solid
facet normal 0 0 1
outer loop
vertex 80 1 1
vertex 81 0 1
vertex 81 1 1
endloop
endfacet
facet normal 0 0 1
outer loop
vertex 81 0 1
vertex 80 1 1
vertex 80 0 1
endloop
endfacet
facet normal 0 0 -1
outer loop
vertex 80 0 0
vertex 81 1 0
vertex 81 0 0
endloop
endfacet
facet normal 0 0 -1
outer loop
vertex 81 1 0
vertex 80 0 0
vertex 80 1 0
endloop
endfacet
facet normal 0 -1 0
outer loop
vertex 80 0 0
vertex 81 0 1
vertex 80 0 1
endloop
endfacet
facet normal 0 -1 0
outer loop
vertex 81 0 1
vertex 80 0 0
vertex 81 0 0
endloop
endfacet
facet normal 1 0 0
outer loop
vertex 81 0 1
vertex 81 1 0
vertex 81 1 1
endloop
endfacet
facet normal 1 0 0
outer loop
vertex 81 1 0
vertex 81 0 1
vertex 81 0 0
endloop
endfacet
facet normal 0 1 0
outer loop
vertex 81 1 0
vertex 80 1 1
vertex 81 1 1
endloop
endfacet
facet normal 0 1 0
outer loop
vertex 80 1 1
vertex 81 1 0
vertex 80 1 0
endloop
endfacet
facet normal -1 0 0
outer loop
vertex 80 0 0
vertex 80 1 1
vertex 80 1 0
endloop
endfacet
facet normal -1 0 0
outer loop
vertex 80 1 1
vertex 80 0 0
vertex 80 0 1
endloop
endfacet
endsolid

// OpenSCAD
// file: C:/gh/oomlout_oobb_part_motor_gearbox_wave_drive_version_5/parts/oobb_part_motor_gearbox_wave_drive_version_5_12_to_1_reduction/compact_helpers.scad
// Reusable native geometry helpers.
function polar(r,a)=[r*cos(a),r*sin(a)];
function rotate_point(p,a)=[p[0]*cos(a)-p[1]*sin(a),p[0]*sin(a)+p[1]*cos(a)];
function profile_point(t)=let(
    s=sqrt(pow(pitch_radius,2)-pow(eccentricity*sin(cavity_count*t),2)),
    r=eccentricity*cos(cavity_count*t)+s,
    xi=atan2(eccentricity*cavity_count*sin(cavity_count*t),s),
    rr=roller_radius+profile_clearance)
    [r*cos(t)+rr*cos(t+xi),r*sin(t)+rr*sin(t+xi)];
function profile_points(upper=false)=[for(i=[0:cavity_count*profile_samples_per_cavity-1])
    rotate_point(profile_point(360*i/(cavity_count*profile_samples_per_cavity)),0)];
function roller_position(i,a,upper=false)=let(
    t=-a/roller_count+360*i/roller_count,
    rel=t-a-(upper?180:0),
    r=eccentricity*cos(rel)+sqrt(pow(pitch_radius,2)-pow(eccentricity*sin(rel),2))) polar(r,t);
module tube(ro,ri,h) { difference() { cylinder(r=ro,h=h); translate([0,0,-eps]) cylinder(r=ri,h=h+2*eps); } }
module screw_hole(size,h) { scale([1,1,h]) { if(size=="m2") oobb_hole_m2(); if(size=="m3") oobb_hole_m3(); if(size=="m6") oobb_hole_m6(); } }
module socket_recess(size,depth) {
    // OOBB socket head starts at the under-head plane and extends outward.
    scale([1,1,depth/(size=="m3"?3.2:2.2)]) {
        if(size=="m3") oobb_socket_m3(); else oobb_socket_m2();
    }
}
module at_mounts(points) { for(p=points) translate([p[0],p[1],0]) children(); }
module shaft_cut(h,fit=shaft_fit_clearance) {
    linear_extrude(h) intersection() {
        circle(r=input_shaft_diameter/2+fit);
        translate([-10,-10]) square([10+input_shaft_diameter/2-input_shaft_flat_depth+fit,20]);
    }
}
module rounded_rectangle_plate(size=[119,119,3],radius=1.5) {
    hull() for(x=[-1,1],y=[-1,1]) translate([x*(size[0]/2-radius),y*(size[1]/2-radius),0]) cylinder(r=radius,h=size[2]);
}
module grid_cuts(h) {
    // Actual OOBB grid centres: six units are centred on half-pitch offsets.
    for(i=[0:base_width-1],j=[0:base_height-1])
        let(x=(i-(base_width-1)/2)*oobb_grid_pitch,y=(j-(base_height-1)/2)*oobb_grid_pitch)
        if(sqrt(x*x+y*y)>housing_radius+3.5)
            translate([x,y,-eps]) screw_hole("m6",h+2*eps);
}
module wave_generator() {
    render(convexity=20) difference() {
        tube(wave_radius,12.6,wave_height);
        translate([0,0,wave_seat_z]) cylinder(r=13.5+bearing_seat_clearance,h=wave_height);
        translate([0,0,wave_height-wave_cap_depth]) cylinder(r=22.15,h=wave_cap_depth+eps);
        at_mounts(wave_mounts) {
            translate([0,0,-eps]) screw_hole("m3",wave_height+2*eps);
            translate([0,0,wave_nut_z]) scale([1,1,(wave_height-wave_cap_depth-wave_nut_z+eps)/2.7]) oobb_nut_m3();
        }
    }
}
module wave_cap() {
    render(convexity=20) difference() {
        tube(22,12.6,wave_cap_depth);
        at_mounts(wave_mounts) {
            translate([0,0,-eps]) screw_hole("m3",wave_cap_depth+2*eps);
            translate([0,0,wave_cap_depth-wave_head_recess]) socket_recess("m3",wave_head_recess+eps);
        }
    }
}
// file: C:/gh/oomlout_oobb_part_motor_gearbox_wave_drive_version_5/parts/oobb_part_motor_gearbox_wave_drive_version_5_12_to_1_reduction/nema17_reference.scad
// Visual reference matching the previous cycloidal project's 40 mm motor envelope.
// Face is Z=0; motor body extends towards -Z and shaft towards +Z.
// End caps, corner chamfers and connector are illustrative external details.
// This is purchased reference hardware, never a printable gearbox component.
module nema17_outline(width=42.3,depth=6,chamfer=3) {
    w=width/2;
    linear_extrude(depth) polygon([
        [-w+chamfer,-w],[w-chamfer,-w],[w,-w+chamfer],[w,w-chamfer],
        [w-chamfer,w],[-w+chamfer,w],[-w,w-chamfer],[-w,-w+chamfer]
    ]);
}
module nema17_front() {
    difference() {
        translate([0,0,-motor_cap_depth])
            nema17_outline(motor_body_width,motor_cap_depth,motor_corner_chamfer);
        for(x=[-motor_hole_pitch/2,motor_hole_pitch/2],y=[-motor_hole_pitch/2,motor_hole_pitch/2])
            translate([x,y,-motor_thread_depth]) cylinder(d=3,h=motor_thread_depth+0.01);
        translate([0,0,-motor_cap_depth-0.01]) cylinder(d=motor_shaft_diameter,h=motor_cap_depth+0.02);
    }
}
module nema17_stator() {
    translate([0,0,-motor_body_depth+motor_cap_depth])
        nema17_outline(motor_body_width,motor_body_depth-2*motor_cap_depth,motor_corner_chamfer);
}
module nema17_rear() {
    difference() {
        translate([0,0,-motor_body_depth])
            nema17_outline(motor_body_width,motor_cap_depth,motor_corner_chamfer);
        for(x=[-motor_hole_pitch/2,motor_hole_pitch/2],y=[-motor_hole_pitch/2,motor_hole_pitch/2])
            translate([x,y,-motor_body_depth-0.01]) cylinder(d=4.5,h=1.2);
    }
}
module nema17_pilot() {
    difference() {
        cylinder(d=motor_pilot_diameter,h=motor_pilot_height);
        translate([0,0,-0.01]) cylinder(d=motor_shaft_diameter,h=motor_pilot_height+0.02);
    }
}
module nema17_shaft() {
    linear_extrude(motor_shaft_length) intersection() {
        circle(d=motor_shaft_diameter);
        translate([-10,-10]) square([10+motor_shaft_diameter/2-motor_shaft_flat_depth,20]);
    }
}
module nema17_connector() {
    // Indicative connector envelope; actual cable exit depends on motor model.
    translate([-7,motor_body_width/2-1,-motor_body_depth+motor_cap_depth])
        cube([14,5,7]);
}
module nema17_reference() {
    color("Silver") { nema17_front(); nema17_rear(); nema17_pilot(); nema17_shaft(); }
    color([0.08,0.08,0.08]) nema17_stator();
    color([0.2,0.2,0.2]) nema17_connector();
}
// file: C:/gh/oomlout_oobb_part_motor_gearbox_wave_drive_version_5/parts/oobb_part_motor_gearbox_wave_drive_version_5_12_to_1_reduction/motor_reference_parameters.scad
// Purchased motor envelope. Recipe defines body, shaft and mounting dimensions.
motor_body_depth = 40.0;
motor_shaft_length = 24.0;
motor_hole_pitch = 31.0;
motor_thread_depth = 6.0;
motor_pilot_diameter = 22.0;
motor_pilot_height = 2.0;
motor_shaft_end_clearance = 0.5;
motor_thread_engagement = 5.2;
motor_shaft_diameter = 5.0;
motor_body_width = 42.3;
motor_cap_depth = 6.0;
motor_corner_chamfer = 3.0;
motor_shaft_flat_depth = 0.5;
motor_face_z = 0.0;
// file: C:/gh/oomlout_oobb_part_motor_gearbox_wave_drive_version_5/parts/oobb_part_motor_gearbox_wave_drive_version_5_12_to_1_reduction/oobb_hardware.scad
module oobb_rounded_rectangle_edges(size, radius, radius_top, radius_bottom) {
      rt=radius_top; rb=radius_bottom; depth=size[2]; n=16;
      lower=rb==0 ? [[radius,0]] :
        [for(i=[0:n]) let(a=-90+90*i/n) [radius-rb+rb*cos(a),rb+rb*sin(a)]];
      upper=rt==0 ? [[radius,depth]] :
        [for(i=[0:n]) let(a=90*i/n) [radius-rt+rt*cos(a),depth-rt+rt*sin(a)]];
      hull() for(x=[-size[0]/2+radius,size[0]/2-radius])
        for(y=[-size[1]/2+radius,size[1]/2-radius])
          translate([x,y,0]) rotate_extrude()
            polygon(concat([[0,0]],lower,upper,[[0,depth]]));
    }
// Generated from installed OOBB v5. All primitives use overhang=True.

module oobb_motor_plate_body() {


difference() {
	union() {
		translate(v = [0, 0, 0]) {
			rotate(a = [0, 0, 0]) {
				difference() {
					union() {
						oobb_rounded_rectangle_edges(radius = 1.5, radius_bottom = 1.5, radius_top = 1.5, size = [89.0, 89.0, 4.0]);
					}
					union();
				}
			}
		}
	}
	union();
}

}

module oobb_hole_m2() {


difference() {
	union() {
		cylinder(h = 1, r = 1.35);
	}
	union();
}

}

module oobb_hole_m3() {


difference() {
	union() {
		cylinder(h = 1, r = 1.8);
	}
	union();
}

}

module oobb_hole_m6() {


difference() {
	union() {
		cylinder(h = 1, r = 3.25);
	}
	union();
}

}

module oobb_nut_m2() {


difference() {
	union() {
		translate(v = [0, 0, 0]) {
			rotate(a = [0, 0, 0]) {
				difference() {
					union() {
						linear_extrude(height = 2.2) {
							polygon(points = [[2.4234, 0.0], [1.2117000000000002, 2.0987259635312085], [-1.2116999999999996, 2.0987259635312085], [-2.4234, 2.967809053053696e-16], [-1.211700000000001, -2.098725963531208], [1.2116999999999984, -2.0987259635312094]]);
						}
						translate(v = [-1.25, -2.75, -0.3]) {
							cube(size = [2.5, 5.5, 0.3]);
						}
						translate(v = [-1.25, -1.25, -0.6]) {
							cube(size = [2.5, 2.5, 0.3]);
						}
						translate(v = [-1.25, -2.75, 2.2]) {
							cube(size = [2.5, 5.5, 0.3]);
						}
						translate(v = [-1.25, -1.25, 2.5]) {
							cube(size = [2.5, 2.5, 0.3]);
						}
					}
					union();
				}
			}
		}
	}
	union();
}

}

module oobb_socket_m2() {


difference() {
	union() {
		translate(v = [0, 0, 0]) {
			rotate(a = [0, 0, 0]) {
				difference() {
					union() {
						cylinder(h = 2.2, r = 2.1);
						translate(v = [-1.25, -2.75, -0.3]) {
							cube(size = [2.5, 5.5, 0.3]);
						}
						translate(v = [-1.25, -1.25, -0.6]) {
							cube(size = [2.5, 2.5, 0.3]);
						}
					}
					union();
				}
			}
		}
	}
	union();
}

}

module oobb_nut_m3() {


difference() {
	union() {
		translate(v = [0, 0, 0]) {
			rotate(a = [0, 0, 0]) {
				difference() {
					union() {
						linear_extrude(height = 2.7) {
							polygon(points = [[3.4619999999999997, 0.0], [1.7310000000000003, 2.9981799479017264], [-1.7309999999999992, 2.9981799479017264], [-3.4619999999999997, 4.2397272186481365e-16], [-1.7310000000000014, -2.998179947901726], [1.7309999999999977, -2.9981799479017277]]);
						}
						translate(v = [-1.75, -3.25, -0.3]) {
							cube(size = [3.5, 6.5, 0.3]);
						}
						translate(v = [-1.75, -1.75, -0.6]) {
							cube(size = [3.5, 3.5, 0.3]);
						}
						translate(v = [-1.75, -3.25, 2.7]) {
							cube(size = [3.5, 6.5, 0.3]);
						}
						translate(v = [-1.75, -1.75, 3.0]) {
							cube(size = [3.5, 3.5, 0.3]);
						}
					}
					union();
				}
			}
		}
	}
	union();
}

}

module oobb_socket_m3() {


difference() {
	union() {
		translate(v = [0, 0, 0]) {
			rotate(a = [0, 0, 0]) {
				difference() {
					union() {
						cylinder(h = 3.2, r = 3.0);
						translate(v = [-1.75, -3.25, -0.3]) {
							cube(size = [3.5, 6.5, 0.3]);
						}
						translate(v = [-1.75, -1.75, -0.6]) {
							cube(size = [3.5, 3.5, 0.3]);
						}
					}
					union();
				}
			}
		}
	}
	union();
}

}

module oobb_nut_m6() {


difference() {
	union() {
		translate(v = [0, 0, 0]) {
			rotate(a = [0, 0, 0]) {
				difference() {
					union() {
						linear_extrude(height = 5.2) {
							polygon(points = [[5.914249999999999, 0.0], [2.957125, 5.1218907443321156], [-2.9571249999999982, 5.1218907443321156], [-5.914249999999999, 7.242867331857232e-16], [-2.9571250000000022, -5.121890744332115], [2.9571249999999956, -5.121890744332118]]);
						}
						translate(v = [-2.875, -5.0, -0.3]) {
							cube(size = [5.75, 10, 0.3]);
						}
						translate(v = [-2.875, -2.875, -0.6]) {
							cube(size = [5.75, 5.75, 0.3]);
						}
						translate(v = [-2.875, -5.0, 5.2]) {
							cube(size = [5.75, 10, 0.3]);
						}
						translate(v = [-2.875, -2.875, 5.5]) {
							cube(size = [5.75, 5.75, 0.3]);
						}
					}
					union();
				}
			}
		}
	}
	union();
}

}
// file: C:/gh/oomlout_oobb_part_motor_gearbox_wave_drive_version_5/parts/oobb_part_motor_gearbox_wave_drive_version_5_12_to_1_reduction/parameters.scad
// Generated by working_scad.py. Edit the Python recipe to persist changes.
style = "version_5";
reduction = 12;
bearing_output = "6810";
bearing_wave = "6704";
roller_diameter = 7.0;
roller_bore_diameter = 3.2;
roller_length = 12.0;
roller_material = "nylon";
roller_bank_count = 1;
motor_plate_depth = 4.0;
motor_body_depth = 40.0;
motor_shaft_length = 24.0;
motor_hole_pitch = 31.0;
motor_thread_depth = 6.0;
motor_pilot_diameter = 22.0;
motor_pilot_height = 2.0;
output_holder_wall = 7.0;
max_screw_length = 35.0;
eccentricity = 0.75;
wave_radius = 23.25;
profile_clearance = 0.15;
roller_slot_clearance = 0.3;
roller_end_clearance = 0.3;
cage_wall = 4.0;
cage_plate_depth = 3.0;
bearing_seat_clearance = 0.1;
journal_clearance = 0.05;
bearing_axial_clearance = 0.2;
output_plate_diameter = 65.0;
output_plate_depth = 6.0;
output_grid_pitch = 15.0;
output_face_clearance = 0.3;
output_socket_recess = 4.0;
output_screw_length = 16;
output_nut_depth = 5.2;
output_nut_height = 5.0;
motor_shaft_end_clearance = 0.5;
base_width = 6;
base_height = 6;
oobb_grid_pitch = 15.0;
oobb_size_allowance = 1.0;
base_edge_radius = 1.5;
housing_flange_corner_radius = 1.5;
housing_screw_pitch_radius = 35.5;
housing_screw_count = 6;
input_shaft_diameter = 5.0;
input_shaft_flat_depth = 0.5;
shaft_fit_clearance = 0.1;
cage_screw_count = 4;
profile_samples_per_cavity = 100;
circle_fragments = 120;
overhang = true;
run_scad = true;
run_solidcraft = false;
generate_stl = true;
generate_previews = true;
generate_renders = true;
validate_geometry = true;
package_outputs = true;
render_threads = 8;
variant = "default";
// main file
include <C:/gh/oomlout_oobb_part_motor_gearbox_wave_drive_version_5/parts/oobb_part_motor_gearbox_wave_drive_version_5_12_to_1_reduction/parameters.scad>
include <C:/gh/oomlout_oobb_part_motor_gearbox_wave_drive_version_5/parts/oobb_part_motor_gearbox_wave_drive_version_5_12_to_1_reduction/oobb_hardware.scad>
include <C:/gh/oomlout_oobb_part_motor_gearbox_wave_drive_version_5/parts/oobb_part_motor_gearbox_wave_drive_version_5_12_to_1_reduction/geometry.scad>
include <C:/gh/oomlout_oobb_part_motor_gearbox_wave_drive_version_5/parts/oobb_part_motor_gearbox_wave_drive_version_5_12_to_1_reduction/motor_reference_parameters.scad>
include <C:/gh/oomlout_oobb_part_motor_gearbox_wave_drive_version_5/parts/oobb_part_motor_gearbox_wave_drive_version_5_12_to_1_reduction/nema17_reference.scad>
translate([80,0,0]) cube([1,1,1]);
intersection() { translate([0,0,cam_base_z]) motor_eccentric(); translate([0,0,cam_cap_z]) motor_eccentric_cap(); }
